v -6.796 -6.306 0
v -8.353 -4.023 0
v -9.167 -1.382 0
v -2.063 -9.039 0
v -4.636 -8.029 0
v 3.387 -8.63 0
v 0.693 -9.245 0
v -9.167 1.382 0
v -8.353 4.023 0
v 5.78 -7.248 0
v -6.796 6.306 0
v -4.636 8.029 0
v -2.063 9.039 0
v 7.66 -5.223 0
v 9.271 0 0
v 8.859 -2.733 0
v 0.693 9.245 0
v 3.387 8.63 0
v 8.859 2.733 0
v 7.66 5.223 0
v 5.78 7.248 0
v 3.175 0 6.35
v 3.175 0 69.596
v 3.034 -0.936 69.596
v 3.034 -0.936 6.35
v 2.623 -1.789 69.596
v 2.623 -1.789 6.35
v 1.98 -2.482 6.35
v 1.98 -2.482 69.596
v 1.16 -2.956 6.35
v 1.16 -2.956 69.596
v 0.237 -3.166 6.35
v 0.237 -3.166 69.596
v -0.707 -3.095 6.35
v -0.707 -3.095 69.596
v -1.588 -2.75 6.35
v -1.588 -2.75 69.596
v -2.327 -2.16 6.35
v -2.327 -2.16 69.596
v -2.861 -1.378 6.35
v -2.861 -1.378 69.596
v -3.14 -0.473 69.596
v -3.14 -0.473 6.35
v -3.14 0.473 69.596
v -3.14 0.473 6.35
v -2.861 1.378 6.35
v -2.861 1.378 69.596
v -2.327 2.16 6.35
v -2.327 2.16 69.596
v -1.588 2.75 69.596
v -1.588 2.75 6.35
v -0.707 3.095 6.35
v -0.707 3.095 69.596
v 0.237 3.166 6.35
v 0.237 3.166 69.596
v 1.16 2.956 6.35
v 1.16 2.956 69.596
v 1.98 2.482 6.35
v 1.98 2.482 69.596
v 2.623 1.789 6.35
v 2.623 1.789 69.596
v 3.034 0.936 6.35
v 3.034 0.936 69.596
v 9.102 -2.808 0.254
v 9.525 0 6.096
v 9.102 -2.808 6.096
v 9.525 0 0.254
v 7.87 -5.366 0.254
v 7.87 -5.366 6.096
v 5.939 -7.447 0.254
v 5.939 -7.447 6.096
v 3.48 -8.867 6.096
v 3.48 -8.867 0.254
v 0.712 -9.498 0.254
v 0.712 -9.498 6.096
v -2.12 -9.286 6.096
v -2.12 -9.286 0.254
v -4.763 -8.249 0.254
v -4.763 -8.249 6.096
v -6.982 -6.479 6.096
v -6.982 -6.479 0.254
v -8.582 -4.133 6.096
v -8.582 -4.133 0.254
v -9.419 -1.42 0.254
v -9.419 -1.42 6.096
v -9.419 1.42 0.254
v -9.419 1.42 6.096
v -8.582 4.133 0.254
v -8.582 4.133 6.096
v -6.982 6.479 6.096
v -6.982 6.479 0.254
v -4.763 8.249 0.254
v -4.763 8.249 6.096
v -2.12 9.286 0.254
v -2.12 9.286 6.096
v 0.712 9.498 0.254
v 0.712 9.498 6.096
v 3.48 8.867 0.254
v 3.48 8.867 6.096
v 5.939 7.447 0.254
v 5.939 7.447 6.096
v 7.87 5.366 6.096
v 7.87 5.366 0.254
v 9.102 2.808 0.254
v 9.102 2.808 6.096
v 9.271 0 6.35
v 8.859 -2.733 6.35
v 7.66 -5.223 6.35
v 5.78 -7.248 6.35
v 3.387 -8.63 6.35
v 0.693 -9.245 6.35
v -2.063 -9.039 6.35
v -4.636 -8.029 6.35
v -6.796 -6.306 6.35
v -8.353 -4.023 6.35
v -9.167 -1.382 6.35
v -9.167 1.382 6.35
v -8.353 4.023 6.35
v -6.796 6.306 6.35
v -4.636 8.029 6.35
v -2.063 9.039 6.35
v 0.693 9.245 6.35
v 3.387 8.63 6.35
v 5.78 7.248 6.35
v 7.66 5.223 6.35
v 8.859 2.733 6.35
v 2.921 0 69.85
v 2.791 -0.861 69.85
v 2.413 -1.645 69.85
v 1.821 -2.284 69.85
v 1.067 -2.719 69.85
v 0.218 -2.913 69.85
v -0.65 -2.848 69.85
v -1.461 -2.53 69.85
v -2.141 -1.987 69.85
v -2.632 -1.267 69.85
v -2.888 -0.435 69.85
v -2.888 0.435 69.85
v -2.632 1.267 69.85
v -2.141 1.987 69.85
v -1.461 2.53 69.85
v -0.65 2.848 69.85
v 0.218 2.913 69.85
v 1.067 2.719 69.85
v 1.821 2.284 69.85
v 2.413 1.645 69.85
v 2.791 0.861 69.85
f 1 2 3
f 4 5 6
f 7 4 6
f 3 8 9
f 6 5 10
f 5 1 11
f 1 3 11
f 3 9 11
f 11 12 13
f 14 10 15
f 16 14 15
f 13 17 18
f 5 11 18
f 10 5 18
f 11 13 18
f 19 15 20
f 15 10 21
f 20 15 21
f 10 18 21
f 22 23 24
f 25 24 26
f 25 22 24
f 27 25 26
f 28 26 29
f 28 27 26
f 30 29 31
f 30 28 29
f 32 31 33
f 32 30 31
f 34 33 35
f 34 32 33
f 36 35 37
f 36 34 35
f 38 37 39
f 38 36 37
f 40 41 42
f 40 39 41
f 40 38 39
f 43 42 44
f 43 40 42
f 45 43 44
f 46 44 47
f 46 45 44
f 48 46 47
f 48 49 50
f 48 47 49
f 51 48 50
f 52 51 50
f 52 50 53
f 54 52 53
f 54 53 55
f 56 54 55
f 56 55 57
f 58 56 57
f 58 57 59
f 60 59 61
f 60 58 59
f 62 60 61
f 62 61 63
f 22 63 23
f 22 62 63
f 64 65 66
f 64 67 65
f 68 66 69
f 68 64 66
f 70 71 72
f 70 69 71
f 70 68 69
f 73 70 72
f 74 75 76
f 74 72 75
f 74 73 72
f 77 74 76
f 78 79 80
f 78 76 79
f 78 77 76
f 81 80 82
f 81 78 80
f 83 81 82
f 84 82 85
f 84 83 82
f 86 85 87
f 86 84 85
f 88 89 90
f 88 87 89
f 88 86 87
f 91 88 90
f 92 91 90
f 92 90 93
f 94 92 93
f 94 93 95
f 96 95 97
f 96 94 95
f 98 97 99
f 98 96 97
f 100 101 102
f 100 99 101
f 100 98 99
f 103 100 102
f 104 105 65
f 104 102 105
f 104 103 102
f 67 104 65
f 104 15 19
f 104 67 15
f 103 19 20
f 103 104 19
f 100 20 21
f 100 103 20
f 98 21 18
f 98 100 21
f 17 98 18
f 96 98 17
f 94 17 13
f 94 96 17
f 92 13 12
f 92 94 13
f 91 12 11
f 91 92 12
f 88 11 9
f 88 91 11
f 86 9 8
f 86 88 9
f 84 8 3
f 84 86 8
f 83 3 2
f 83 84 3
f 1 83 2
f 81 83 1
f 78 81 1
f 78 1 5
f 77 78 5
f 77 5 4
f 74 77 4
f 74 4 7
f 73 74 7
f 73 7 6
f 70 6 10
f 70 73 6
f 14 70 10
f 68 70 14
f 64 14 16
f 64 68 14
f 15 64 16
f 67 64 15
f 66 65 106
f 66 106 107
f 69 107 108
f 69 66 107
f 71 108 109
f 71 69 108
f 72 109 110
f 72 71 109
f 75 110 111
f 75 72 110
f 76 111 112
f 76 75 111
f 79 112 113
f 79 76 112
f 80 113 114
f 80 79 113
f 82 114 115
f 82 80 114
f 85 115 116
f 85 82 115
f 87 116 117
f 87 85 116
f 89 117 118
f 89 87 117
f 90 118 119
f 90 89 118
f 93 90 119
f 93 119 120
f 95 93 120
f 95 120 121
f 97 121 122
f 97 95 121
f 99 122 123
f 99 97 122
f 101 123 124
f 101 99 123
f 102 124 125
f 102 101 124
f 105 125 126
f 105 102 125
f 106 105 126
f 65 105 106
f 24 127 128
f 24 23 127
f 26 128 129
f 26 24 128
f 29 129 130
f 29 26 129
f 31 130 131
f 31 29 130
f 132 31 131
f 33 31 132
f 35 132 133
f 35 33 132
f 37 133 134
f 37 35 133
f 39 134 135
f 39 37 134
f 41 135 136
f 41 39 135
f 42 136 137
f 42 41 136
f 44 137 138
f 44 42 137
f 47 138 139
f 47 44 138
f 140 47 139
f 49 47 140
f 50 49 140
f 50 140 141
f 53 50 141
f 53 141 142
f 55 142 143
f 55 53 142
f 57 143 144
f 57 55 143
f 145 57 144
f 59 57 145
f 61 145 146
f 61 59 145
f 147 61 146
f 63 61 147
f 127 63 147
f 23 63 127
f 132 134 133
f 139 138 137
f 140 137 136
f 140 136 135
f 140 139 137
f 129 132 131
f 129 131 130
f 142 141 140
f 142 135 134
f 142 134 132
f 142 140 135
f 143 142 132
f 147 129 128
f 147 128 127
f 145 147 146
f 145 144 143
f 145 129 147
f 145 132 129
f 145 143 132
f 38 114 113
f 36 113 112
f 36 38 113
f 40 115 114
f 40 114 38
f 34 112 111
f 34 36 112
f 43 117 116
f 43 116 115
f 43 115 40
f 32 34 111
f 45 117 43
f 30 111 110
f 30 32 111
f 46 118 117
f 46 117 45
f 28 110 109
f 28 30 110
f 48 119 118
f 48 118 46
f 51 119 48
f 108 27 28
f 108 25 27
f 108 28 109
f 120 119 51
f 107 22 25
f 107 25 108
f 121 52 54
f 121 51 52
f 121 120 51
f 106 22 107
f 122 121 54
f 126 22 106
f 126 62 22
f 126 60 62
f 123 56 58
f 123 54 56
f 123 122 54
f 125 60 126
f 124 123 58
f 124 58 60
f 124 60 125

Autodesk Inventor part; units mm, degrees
ref_plane "YZ Plane" through (0, 0, 0) normal (1, 0, 0) x (0, 1, 0)
ref_plane "XZ Plane" through (0, 0, 0) normal (0, 1, 0) x (-1, 0, 0)
ref_plane "XY Plane" through (0, 0, 0) normal (0, 0, 1) x (1, 0, 0)
sketch "Sketch1" plane through (0, 0, 0) normal (0, 0, 1) x (1, 0, 0)
  circle A0 centre (0, 0) radius 9.525
extrude "Extrusion1" add sketch "Sketch1" along normal blind 6.35
sketch "Sketch2" plane through (0, 0, 6.35) normal (0, 0, 1) x (1, 0, 0)
  circle A0 centre (0, 0) radius 9.525 projected
  circle A1 centre (0, 0) radius 3.175
extrude "Extrusion2" add sketch "Sketch2" along normal blind 63.5 contours A1
chamfer "Chamfer1" distance 0.254 angle 45 3 edges at (-3.175, 0, 69.85) (-9.525, 0, 6.35) (-9.525, 0, 0)
properties part number "piston_rod"
